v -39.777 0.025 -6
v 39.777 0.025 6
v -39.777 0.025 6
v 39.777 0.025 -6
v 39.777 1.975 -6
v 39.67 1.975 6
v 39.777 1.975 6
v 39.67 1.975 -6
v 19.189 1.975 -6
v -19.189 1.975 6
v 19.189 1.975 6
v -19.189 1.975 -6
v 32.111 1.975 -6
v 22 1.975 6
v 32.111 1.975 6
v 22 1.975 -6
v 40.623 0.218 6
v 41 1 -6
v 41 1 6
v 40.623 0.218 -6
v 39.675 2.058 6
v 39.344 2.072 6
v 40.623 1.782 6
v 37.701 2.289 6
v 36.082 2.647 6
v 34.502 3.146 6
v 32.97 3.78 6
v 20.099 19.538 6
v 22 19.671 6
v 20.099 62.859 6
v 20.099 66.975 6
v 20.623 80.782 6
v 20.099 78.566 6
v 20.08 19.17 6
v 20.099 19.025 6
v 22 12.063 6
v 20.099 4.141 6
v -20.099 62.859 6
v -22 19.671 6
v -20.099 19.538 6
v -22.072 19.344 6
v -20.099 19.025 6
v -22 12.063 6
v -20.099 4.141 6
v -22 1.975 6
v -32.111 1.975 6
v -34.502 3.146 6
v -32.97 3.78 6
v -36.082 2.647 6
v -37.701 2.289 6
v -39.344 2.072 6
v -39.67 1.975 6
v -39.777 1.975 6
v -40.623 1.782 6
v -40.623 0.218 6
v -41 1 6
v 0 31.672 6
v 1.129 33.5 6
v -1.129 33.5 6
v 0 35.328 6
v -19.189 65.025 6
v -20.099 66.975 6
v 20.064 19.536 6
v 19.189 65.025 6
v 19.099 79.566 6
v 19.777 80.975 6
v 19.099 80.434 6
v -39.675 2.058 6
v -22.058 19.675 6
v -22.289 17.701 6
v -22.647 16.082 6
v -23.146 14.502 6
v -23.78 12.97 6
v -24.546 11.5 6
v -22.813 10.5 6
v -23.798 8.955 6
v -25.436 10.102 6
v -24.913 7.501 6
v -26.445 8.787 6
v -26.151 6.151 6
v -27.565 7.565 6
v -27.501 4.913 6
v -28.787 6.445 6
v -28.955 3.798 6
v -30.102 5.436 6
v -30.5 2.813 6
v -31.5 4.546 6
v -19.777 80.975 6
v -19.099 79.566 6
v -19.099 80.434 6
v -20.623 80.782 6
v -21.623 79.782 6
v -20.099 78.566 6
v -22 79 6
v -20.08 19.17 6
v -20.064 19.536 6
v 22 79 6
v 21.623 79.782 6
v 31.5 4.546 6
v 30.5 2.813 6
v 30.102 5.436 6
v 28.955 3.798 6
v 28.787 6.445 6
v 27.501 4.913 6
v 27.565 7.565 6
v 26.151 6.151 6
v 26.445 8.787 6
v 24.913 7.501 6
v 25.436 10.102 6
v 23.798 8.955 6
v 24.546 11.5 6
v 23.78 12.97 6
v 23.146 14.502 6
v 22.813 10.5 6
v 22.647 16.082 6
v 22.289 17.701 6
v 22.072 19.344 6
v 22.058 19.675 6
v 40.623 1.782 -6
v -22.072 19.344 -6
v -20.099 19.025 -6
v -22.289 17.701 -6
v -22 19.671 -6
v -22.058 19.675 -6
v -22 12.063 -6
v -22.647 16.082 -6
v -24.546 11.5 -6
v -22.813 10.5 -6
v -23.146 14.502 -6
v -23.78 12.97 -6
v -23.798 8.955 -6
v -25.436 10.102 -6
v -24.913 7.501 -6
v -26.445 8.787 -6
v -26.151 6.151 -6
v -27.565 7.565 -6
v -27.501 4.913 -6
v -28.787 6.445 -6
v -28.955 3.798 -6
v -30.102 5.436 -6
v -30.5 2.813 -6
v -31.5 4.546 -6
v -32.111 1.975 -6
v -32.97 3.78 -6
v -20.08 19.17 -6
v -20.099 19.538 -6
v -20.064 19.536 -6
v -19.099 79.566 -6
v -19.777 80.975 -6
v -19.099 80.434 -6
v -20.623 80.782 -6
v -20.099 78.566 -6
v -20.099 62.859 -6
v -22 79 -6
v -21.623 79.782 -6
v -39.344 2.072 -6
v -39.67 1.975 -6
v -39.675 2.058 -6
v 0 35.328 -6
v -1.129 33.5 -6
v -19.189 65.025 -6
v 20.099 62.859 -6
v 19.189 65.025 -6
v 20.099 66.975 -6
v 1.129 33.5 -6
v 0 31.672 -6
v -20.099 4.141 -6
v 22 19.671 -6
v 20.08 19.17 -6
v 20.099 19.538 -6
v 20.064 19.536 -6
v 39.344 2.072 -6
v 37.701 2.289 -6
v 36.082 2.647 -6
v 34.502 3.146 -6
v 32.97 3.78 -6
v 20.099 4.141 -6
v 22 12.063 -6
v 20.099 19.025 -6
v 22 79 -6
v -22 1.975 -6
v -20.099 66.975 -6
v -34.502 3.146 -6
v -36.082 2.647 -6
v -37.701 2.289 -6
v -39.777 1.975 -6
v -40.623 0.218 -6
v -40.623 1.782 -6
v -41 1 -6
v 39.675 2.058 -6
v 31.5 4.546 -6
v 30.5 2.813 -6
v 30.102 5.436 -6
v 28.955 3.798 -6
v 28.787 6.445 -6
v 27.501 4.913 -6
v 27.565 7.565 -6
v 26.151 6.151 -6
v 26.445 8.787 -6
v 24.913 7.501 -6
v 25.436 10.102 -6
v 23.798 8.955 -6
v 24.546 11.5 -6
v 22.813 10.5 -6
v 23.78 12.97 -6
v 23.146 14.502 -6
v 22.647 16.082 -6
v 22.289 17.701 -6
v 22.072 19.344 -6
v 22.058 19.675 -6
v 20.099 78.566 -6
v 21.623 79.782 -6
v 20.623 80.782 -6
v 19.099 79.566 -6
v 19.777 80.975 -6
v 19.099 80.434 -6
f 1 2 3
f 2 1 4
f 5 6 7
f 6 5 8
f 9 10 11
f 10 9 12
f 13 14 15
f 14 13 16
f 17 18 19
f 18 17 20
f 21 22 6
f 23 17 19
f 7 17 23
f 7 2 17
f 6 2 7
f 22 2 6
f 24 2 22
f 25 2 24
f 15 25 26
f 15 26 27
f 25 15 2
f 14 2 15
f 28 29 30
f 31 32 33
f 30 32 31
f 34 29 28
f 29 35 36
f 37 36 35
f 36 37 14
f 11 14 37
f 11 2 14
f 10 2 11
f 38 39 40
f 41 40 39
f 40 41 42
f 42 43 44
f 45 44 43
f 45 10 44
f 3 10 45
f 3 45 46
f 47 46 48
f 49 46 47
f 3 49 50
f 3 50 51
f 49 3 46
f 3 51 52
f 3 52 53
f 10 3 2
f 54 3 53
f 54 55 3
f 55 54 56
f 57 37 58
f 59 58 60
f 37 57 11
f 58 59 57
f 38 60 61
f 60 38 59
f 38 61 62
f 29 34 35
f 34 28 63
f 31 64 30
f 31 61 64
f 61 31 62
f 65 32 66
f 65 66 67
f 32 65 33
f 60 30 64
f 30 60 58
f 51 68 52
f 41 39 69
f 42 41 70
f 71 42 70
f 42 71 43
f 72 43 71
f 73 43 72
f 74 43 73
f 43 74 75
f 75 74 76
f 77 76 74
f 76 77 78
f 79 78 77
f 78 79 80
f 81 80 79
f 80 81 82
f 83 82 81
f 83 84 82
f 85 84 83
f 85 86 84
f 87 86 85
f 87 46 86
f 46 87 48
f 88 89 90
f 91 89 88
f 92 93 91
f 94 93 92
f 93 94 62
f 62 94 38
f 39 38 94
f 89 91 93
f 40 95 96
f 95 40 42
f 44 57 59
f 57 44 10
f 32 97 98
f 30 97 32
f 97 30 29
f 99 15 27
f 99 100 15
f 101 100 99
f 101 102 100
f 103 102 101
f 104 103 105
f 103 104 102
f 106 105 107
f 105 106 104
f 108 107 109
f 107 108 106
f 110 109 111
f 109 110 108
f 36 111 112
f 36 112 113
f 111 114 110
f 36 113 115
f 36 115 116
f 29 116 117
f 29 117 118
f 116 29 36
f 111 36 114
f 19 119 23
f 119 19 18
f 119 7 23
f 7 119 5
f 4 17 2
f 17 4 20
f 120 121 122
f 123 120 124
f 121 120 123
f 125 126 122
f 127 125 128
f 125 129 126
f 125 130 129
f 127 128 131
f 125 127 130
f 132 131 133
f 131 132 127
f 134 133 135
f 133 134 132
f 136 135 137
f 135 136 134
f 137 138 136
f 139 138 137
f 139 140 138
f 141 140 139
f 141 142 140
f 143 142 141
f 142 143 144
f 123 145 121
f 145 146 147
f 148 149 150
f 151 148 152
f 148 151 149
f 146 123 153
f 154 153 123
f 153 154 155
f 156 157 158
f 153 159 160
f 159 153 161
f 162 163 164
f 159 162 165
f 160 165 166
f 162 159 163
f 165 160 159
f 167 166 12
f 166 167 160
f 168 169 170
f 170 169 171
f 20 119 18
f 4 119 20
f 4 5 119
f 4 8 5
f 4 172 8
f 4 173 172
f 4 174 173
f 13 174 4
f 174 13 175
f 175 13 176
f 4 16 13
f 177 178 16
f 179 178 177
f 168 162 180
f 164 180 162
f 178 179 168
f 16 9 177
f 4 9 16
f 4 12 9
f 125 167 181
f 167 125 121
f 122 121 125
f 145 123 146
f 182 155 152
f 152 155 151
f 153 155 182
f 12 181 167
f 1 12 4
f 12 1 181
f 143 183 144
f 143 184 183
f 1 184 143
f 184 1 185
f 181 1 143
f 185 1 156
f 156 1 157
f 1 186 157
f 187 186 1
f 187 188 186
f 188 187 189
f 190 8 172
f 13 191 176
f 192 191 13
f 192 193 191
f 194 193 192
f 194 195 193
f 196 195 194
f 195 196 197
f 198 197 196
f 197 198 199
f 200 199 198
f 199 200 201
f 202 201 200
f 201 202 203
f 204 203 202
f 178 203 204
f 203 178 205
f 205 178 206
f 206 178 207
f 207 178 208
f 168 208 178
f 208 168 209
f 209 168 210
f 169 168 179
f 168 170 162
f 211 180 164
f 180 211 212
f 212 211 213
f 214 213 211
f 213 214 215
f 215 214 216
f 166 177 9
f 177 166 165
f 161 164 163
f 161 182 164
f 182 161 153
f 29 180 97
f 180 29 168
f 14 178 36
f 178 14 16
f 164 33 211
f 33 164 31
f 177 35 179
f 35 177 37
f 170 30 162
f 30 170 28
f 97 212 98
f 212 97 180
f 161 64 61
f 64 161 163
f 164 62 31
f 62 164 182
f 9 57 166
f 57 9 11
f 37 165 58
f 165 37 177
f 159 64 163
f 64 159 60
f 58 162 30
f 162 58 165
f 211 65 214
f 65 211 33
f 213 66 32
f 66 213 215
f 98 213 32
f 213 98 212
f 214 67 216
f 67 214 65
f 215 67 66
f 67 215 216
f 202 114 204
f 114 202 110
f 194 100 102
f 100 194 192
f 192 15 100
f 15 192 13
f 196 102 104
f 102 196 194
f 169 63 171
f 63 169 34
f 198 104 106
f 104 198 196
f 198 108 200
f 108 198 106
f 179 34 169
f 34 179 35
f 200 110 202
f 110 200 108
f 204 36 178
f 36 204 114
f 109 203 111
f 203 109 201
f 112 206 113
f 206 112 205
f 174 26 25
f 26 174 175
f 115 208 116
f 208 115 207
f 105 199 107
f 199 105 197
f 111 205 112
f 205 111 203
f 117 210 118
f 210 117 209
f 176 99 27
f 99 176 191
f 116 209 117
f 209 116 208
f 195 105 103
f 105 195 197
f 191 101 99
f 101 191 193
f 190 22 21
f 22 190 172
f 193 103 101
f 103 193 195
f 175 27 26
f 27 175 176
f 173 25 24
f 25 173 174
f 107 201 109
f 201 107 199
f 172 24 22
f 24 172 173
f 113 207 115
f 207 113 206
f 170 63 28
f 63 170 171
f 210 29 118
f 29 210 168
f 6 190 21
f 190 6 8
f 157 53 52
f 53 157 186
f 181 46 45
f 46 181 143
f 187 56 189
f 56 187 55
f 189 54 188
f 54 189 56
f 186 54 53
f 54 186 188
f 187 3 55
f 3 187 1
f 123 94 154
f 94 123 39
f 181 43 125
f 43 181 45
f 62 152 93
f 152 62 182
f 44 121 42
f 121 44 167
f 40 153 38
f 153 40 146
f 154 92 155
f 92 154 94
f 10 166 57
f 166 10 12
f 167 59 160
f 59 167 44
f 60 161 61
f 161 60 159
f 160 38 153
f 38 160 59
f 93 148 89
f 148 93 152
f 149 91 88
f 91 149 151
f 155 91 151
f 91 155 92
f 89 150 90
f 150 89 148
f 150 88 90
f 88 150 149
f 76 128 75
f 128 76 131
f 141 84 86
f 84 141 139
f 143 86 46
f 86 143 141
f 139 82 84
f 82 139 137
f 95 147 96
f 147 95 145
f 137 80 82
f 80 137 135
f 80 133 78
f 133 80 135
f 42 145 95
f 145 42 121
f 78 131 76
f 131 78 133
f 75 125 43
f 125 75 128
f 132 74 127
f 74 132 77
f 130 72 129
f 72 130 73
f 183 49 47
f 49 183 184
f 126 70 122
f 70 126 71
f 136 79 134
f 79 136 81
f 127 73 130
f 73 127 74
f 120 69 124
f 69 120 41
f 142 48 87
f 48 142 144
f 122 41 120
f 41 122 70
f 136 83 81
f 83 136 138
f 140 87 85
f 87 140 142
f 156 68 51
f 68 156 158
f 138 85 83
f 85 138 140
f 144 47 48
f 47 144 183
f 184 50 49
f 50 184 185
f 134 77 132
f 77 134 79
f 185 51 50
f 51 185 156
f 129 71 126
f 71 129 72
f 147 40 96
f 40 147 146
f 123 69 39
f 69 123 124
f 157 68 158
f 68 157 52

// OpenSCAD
width = 40;
height = 67;
track_height = 12;
support_width = 20;
thickness = 2;

$fa = 5;
$fs = 1;

extra_width = (support_width <= height) ? support_width : height;

points = [
    [-thickness,thickness/2],
    [width/2+thickness/2,thickness/2],
    [width/2+thickness/2,height-thickness/2],
    [-thickness,height-thickness/2],
    [0,height/2],
    [width/2+extra_width,thickness/2],
    [width/2+thickness/2,height+track_height],
    [width/2,height+track_height+thickness/2]
];

links = [[0,5],[1,6],[2,3],[1,4],[2,4],[6,7]];

mirX() union() {
    mesh(points, links, d=thickness, h=track_height);
    translate([width/2+extra_width+thickness/2,extra_width+thickness/2,0])
        rotate(-45)
            arc(h=track_height,d=extra_width*2+thickness,d2=extra_width*2-thickness, a=82);
}




module arc(h, d, t, a=360, d1=false, d2=false) {
	outerD = (d1==false) ? d : d1;
	innerD = (d2==false) ? d-t*2 : d2;
	2dia = 2*d;
	difference() {
	 	difference() {
			cylinder(h=h, d=d, center=true);
			cylinder(h=h+1, d=innerD, center=true);
		}
		//triangle
		if(a<360) {
			linear_extrude(height = h+1, center = true, convexity=10)
				polygon(points=[[0,0],[2dia*sin(a/2),-2dia*cos(a/2)],[2dia,-2dia],[2dia,2dia],[-2dia,2dia],[-2dia,-2dia],[-2dia*sin(a/2),-2dia*cos(a/2)]]);
		}
	}
}

module mesh(p, x="All", d=5, h=5, shape="cylinder", cenTrue=true) {
	//echo(len(d));
	d= (len(d)>1) ? d : [d,d,d,d,d,d,d,d,d,d,d,d,d,d,d,d,d,d,d,d,d,d,d,d,d,d,d];
	//x = (x=='Chain') ? [ for (i = [0:len(p)]) [i,i+1] ] : x;
	all= (x=="All") ? true : false;
	if (all==false) {
		for(i = x) {
			hull() {
				//echo(d[i[0]], d[i[1]]);
				translate(p[i[0]]) part(shape, d=d[i[0]], h=h, center=cenTrue);
				translate(p[i[1]]) part(shape, d=d[i[1]], h=h, center=cenTrue);
			}
		}
	} else {
		for(i = [0:len(p)-1]) {
			for(j = [i:len(p)-1]) {
				hull() {
					echo(i, j, p[i], p[j]);
					translate(p[i]) part(shape, d=d[i], h=h, center=cenTrue);
					translate(p[j]) part(shape, d=d[j], h=h, center=cenTrue);
				}
			}
		}
	}
	module part(type, d, h=0, cenTrue=true) {
		if(type=="cube") {
			cube([d,d,h], center=cenTrue);
		}
		if(type=="sphere") {
			sphere(d=d, center=cenTrue);
		}
		if(type=="cylinder") {
			cylinder(d=d, h=h, center=cenTrue);
		}
	}
}

module mir(plane=[1,0,0]) {
	children();
	mirror(plane)
		children();
}
module mirX() {children(); mirror([1,0,0]) children();}
module mirY() {children(); mirror([0,1,0]) children();}
module mirZ() {children(); mirror([0,0,1]) children();}
